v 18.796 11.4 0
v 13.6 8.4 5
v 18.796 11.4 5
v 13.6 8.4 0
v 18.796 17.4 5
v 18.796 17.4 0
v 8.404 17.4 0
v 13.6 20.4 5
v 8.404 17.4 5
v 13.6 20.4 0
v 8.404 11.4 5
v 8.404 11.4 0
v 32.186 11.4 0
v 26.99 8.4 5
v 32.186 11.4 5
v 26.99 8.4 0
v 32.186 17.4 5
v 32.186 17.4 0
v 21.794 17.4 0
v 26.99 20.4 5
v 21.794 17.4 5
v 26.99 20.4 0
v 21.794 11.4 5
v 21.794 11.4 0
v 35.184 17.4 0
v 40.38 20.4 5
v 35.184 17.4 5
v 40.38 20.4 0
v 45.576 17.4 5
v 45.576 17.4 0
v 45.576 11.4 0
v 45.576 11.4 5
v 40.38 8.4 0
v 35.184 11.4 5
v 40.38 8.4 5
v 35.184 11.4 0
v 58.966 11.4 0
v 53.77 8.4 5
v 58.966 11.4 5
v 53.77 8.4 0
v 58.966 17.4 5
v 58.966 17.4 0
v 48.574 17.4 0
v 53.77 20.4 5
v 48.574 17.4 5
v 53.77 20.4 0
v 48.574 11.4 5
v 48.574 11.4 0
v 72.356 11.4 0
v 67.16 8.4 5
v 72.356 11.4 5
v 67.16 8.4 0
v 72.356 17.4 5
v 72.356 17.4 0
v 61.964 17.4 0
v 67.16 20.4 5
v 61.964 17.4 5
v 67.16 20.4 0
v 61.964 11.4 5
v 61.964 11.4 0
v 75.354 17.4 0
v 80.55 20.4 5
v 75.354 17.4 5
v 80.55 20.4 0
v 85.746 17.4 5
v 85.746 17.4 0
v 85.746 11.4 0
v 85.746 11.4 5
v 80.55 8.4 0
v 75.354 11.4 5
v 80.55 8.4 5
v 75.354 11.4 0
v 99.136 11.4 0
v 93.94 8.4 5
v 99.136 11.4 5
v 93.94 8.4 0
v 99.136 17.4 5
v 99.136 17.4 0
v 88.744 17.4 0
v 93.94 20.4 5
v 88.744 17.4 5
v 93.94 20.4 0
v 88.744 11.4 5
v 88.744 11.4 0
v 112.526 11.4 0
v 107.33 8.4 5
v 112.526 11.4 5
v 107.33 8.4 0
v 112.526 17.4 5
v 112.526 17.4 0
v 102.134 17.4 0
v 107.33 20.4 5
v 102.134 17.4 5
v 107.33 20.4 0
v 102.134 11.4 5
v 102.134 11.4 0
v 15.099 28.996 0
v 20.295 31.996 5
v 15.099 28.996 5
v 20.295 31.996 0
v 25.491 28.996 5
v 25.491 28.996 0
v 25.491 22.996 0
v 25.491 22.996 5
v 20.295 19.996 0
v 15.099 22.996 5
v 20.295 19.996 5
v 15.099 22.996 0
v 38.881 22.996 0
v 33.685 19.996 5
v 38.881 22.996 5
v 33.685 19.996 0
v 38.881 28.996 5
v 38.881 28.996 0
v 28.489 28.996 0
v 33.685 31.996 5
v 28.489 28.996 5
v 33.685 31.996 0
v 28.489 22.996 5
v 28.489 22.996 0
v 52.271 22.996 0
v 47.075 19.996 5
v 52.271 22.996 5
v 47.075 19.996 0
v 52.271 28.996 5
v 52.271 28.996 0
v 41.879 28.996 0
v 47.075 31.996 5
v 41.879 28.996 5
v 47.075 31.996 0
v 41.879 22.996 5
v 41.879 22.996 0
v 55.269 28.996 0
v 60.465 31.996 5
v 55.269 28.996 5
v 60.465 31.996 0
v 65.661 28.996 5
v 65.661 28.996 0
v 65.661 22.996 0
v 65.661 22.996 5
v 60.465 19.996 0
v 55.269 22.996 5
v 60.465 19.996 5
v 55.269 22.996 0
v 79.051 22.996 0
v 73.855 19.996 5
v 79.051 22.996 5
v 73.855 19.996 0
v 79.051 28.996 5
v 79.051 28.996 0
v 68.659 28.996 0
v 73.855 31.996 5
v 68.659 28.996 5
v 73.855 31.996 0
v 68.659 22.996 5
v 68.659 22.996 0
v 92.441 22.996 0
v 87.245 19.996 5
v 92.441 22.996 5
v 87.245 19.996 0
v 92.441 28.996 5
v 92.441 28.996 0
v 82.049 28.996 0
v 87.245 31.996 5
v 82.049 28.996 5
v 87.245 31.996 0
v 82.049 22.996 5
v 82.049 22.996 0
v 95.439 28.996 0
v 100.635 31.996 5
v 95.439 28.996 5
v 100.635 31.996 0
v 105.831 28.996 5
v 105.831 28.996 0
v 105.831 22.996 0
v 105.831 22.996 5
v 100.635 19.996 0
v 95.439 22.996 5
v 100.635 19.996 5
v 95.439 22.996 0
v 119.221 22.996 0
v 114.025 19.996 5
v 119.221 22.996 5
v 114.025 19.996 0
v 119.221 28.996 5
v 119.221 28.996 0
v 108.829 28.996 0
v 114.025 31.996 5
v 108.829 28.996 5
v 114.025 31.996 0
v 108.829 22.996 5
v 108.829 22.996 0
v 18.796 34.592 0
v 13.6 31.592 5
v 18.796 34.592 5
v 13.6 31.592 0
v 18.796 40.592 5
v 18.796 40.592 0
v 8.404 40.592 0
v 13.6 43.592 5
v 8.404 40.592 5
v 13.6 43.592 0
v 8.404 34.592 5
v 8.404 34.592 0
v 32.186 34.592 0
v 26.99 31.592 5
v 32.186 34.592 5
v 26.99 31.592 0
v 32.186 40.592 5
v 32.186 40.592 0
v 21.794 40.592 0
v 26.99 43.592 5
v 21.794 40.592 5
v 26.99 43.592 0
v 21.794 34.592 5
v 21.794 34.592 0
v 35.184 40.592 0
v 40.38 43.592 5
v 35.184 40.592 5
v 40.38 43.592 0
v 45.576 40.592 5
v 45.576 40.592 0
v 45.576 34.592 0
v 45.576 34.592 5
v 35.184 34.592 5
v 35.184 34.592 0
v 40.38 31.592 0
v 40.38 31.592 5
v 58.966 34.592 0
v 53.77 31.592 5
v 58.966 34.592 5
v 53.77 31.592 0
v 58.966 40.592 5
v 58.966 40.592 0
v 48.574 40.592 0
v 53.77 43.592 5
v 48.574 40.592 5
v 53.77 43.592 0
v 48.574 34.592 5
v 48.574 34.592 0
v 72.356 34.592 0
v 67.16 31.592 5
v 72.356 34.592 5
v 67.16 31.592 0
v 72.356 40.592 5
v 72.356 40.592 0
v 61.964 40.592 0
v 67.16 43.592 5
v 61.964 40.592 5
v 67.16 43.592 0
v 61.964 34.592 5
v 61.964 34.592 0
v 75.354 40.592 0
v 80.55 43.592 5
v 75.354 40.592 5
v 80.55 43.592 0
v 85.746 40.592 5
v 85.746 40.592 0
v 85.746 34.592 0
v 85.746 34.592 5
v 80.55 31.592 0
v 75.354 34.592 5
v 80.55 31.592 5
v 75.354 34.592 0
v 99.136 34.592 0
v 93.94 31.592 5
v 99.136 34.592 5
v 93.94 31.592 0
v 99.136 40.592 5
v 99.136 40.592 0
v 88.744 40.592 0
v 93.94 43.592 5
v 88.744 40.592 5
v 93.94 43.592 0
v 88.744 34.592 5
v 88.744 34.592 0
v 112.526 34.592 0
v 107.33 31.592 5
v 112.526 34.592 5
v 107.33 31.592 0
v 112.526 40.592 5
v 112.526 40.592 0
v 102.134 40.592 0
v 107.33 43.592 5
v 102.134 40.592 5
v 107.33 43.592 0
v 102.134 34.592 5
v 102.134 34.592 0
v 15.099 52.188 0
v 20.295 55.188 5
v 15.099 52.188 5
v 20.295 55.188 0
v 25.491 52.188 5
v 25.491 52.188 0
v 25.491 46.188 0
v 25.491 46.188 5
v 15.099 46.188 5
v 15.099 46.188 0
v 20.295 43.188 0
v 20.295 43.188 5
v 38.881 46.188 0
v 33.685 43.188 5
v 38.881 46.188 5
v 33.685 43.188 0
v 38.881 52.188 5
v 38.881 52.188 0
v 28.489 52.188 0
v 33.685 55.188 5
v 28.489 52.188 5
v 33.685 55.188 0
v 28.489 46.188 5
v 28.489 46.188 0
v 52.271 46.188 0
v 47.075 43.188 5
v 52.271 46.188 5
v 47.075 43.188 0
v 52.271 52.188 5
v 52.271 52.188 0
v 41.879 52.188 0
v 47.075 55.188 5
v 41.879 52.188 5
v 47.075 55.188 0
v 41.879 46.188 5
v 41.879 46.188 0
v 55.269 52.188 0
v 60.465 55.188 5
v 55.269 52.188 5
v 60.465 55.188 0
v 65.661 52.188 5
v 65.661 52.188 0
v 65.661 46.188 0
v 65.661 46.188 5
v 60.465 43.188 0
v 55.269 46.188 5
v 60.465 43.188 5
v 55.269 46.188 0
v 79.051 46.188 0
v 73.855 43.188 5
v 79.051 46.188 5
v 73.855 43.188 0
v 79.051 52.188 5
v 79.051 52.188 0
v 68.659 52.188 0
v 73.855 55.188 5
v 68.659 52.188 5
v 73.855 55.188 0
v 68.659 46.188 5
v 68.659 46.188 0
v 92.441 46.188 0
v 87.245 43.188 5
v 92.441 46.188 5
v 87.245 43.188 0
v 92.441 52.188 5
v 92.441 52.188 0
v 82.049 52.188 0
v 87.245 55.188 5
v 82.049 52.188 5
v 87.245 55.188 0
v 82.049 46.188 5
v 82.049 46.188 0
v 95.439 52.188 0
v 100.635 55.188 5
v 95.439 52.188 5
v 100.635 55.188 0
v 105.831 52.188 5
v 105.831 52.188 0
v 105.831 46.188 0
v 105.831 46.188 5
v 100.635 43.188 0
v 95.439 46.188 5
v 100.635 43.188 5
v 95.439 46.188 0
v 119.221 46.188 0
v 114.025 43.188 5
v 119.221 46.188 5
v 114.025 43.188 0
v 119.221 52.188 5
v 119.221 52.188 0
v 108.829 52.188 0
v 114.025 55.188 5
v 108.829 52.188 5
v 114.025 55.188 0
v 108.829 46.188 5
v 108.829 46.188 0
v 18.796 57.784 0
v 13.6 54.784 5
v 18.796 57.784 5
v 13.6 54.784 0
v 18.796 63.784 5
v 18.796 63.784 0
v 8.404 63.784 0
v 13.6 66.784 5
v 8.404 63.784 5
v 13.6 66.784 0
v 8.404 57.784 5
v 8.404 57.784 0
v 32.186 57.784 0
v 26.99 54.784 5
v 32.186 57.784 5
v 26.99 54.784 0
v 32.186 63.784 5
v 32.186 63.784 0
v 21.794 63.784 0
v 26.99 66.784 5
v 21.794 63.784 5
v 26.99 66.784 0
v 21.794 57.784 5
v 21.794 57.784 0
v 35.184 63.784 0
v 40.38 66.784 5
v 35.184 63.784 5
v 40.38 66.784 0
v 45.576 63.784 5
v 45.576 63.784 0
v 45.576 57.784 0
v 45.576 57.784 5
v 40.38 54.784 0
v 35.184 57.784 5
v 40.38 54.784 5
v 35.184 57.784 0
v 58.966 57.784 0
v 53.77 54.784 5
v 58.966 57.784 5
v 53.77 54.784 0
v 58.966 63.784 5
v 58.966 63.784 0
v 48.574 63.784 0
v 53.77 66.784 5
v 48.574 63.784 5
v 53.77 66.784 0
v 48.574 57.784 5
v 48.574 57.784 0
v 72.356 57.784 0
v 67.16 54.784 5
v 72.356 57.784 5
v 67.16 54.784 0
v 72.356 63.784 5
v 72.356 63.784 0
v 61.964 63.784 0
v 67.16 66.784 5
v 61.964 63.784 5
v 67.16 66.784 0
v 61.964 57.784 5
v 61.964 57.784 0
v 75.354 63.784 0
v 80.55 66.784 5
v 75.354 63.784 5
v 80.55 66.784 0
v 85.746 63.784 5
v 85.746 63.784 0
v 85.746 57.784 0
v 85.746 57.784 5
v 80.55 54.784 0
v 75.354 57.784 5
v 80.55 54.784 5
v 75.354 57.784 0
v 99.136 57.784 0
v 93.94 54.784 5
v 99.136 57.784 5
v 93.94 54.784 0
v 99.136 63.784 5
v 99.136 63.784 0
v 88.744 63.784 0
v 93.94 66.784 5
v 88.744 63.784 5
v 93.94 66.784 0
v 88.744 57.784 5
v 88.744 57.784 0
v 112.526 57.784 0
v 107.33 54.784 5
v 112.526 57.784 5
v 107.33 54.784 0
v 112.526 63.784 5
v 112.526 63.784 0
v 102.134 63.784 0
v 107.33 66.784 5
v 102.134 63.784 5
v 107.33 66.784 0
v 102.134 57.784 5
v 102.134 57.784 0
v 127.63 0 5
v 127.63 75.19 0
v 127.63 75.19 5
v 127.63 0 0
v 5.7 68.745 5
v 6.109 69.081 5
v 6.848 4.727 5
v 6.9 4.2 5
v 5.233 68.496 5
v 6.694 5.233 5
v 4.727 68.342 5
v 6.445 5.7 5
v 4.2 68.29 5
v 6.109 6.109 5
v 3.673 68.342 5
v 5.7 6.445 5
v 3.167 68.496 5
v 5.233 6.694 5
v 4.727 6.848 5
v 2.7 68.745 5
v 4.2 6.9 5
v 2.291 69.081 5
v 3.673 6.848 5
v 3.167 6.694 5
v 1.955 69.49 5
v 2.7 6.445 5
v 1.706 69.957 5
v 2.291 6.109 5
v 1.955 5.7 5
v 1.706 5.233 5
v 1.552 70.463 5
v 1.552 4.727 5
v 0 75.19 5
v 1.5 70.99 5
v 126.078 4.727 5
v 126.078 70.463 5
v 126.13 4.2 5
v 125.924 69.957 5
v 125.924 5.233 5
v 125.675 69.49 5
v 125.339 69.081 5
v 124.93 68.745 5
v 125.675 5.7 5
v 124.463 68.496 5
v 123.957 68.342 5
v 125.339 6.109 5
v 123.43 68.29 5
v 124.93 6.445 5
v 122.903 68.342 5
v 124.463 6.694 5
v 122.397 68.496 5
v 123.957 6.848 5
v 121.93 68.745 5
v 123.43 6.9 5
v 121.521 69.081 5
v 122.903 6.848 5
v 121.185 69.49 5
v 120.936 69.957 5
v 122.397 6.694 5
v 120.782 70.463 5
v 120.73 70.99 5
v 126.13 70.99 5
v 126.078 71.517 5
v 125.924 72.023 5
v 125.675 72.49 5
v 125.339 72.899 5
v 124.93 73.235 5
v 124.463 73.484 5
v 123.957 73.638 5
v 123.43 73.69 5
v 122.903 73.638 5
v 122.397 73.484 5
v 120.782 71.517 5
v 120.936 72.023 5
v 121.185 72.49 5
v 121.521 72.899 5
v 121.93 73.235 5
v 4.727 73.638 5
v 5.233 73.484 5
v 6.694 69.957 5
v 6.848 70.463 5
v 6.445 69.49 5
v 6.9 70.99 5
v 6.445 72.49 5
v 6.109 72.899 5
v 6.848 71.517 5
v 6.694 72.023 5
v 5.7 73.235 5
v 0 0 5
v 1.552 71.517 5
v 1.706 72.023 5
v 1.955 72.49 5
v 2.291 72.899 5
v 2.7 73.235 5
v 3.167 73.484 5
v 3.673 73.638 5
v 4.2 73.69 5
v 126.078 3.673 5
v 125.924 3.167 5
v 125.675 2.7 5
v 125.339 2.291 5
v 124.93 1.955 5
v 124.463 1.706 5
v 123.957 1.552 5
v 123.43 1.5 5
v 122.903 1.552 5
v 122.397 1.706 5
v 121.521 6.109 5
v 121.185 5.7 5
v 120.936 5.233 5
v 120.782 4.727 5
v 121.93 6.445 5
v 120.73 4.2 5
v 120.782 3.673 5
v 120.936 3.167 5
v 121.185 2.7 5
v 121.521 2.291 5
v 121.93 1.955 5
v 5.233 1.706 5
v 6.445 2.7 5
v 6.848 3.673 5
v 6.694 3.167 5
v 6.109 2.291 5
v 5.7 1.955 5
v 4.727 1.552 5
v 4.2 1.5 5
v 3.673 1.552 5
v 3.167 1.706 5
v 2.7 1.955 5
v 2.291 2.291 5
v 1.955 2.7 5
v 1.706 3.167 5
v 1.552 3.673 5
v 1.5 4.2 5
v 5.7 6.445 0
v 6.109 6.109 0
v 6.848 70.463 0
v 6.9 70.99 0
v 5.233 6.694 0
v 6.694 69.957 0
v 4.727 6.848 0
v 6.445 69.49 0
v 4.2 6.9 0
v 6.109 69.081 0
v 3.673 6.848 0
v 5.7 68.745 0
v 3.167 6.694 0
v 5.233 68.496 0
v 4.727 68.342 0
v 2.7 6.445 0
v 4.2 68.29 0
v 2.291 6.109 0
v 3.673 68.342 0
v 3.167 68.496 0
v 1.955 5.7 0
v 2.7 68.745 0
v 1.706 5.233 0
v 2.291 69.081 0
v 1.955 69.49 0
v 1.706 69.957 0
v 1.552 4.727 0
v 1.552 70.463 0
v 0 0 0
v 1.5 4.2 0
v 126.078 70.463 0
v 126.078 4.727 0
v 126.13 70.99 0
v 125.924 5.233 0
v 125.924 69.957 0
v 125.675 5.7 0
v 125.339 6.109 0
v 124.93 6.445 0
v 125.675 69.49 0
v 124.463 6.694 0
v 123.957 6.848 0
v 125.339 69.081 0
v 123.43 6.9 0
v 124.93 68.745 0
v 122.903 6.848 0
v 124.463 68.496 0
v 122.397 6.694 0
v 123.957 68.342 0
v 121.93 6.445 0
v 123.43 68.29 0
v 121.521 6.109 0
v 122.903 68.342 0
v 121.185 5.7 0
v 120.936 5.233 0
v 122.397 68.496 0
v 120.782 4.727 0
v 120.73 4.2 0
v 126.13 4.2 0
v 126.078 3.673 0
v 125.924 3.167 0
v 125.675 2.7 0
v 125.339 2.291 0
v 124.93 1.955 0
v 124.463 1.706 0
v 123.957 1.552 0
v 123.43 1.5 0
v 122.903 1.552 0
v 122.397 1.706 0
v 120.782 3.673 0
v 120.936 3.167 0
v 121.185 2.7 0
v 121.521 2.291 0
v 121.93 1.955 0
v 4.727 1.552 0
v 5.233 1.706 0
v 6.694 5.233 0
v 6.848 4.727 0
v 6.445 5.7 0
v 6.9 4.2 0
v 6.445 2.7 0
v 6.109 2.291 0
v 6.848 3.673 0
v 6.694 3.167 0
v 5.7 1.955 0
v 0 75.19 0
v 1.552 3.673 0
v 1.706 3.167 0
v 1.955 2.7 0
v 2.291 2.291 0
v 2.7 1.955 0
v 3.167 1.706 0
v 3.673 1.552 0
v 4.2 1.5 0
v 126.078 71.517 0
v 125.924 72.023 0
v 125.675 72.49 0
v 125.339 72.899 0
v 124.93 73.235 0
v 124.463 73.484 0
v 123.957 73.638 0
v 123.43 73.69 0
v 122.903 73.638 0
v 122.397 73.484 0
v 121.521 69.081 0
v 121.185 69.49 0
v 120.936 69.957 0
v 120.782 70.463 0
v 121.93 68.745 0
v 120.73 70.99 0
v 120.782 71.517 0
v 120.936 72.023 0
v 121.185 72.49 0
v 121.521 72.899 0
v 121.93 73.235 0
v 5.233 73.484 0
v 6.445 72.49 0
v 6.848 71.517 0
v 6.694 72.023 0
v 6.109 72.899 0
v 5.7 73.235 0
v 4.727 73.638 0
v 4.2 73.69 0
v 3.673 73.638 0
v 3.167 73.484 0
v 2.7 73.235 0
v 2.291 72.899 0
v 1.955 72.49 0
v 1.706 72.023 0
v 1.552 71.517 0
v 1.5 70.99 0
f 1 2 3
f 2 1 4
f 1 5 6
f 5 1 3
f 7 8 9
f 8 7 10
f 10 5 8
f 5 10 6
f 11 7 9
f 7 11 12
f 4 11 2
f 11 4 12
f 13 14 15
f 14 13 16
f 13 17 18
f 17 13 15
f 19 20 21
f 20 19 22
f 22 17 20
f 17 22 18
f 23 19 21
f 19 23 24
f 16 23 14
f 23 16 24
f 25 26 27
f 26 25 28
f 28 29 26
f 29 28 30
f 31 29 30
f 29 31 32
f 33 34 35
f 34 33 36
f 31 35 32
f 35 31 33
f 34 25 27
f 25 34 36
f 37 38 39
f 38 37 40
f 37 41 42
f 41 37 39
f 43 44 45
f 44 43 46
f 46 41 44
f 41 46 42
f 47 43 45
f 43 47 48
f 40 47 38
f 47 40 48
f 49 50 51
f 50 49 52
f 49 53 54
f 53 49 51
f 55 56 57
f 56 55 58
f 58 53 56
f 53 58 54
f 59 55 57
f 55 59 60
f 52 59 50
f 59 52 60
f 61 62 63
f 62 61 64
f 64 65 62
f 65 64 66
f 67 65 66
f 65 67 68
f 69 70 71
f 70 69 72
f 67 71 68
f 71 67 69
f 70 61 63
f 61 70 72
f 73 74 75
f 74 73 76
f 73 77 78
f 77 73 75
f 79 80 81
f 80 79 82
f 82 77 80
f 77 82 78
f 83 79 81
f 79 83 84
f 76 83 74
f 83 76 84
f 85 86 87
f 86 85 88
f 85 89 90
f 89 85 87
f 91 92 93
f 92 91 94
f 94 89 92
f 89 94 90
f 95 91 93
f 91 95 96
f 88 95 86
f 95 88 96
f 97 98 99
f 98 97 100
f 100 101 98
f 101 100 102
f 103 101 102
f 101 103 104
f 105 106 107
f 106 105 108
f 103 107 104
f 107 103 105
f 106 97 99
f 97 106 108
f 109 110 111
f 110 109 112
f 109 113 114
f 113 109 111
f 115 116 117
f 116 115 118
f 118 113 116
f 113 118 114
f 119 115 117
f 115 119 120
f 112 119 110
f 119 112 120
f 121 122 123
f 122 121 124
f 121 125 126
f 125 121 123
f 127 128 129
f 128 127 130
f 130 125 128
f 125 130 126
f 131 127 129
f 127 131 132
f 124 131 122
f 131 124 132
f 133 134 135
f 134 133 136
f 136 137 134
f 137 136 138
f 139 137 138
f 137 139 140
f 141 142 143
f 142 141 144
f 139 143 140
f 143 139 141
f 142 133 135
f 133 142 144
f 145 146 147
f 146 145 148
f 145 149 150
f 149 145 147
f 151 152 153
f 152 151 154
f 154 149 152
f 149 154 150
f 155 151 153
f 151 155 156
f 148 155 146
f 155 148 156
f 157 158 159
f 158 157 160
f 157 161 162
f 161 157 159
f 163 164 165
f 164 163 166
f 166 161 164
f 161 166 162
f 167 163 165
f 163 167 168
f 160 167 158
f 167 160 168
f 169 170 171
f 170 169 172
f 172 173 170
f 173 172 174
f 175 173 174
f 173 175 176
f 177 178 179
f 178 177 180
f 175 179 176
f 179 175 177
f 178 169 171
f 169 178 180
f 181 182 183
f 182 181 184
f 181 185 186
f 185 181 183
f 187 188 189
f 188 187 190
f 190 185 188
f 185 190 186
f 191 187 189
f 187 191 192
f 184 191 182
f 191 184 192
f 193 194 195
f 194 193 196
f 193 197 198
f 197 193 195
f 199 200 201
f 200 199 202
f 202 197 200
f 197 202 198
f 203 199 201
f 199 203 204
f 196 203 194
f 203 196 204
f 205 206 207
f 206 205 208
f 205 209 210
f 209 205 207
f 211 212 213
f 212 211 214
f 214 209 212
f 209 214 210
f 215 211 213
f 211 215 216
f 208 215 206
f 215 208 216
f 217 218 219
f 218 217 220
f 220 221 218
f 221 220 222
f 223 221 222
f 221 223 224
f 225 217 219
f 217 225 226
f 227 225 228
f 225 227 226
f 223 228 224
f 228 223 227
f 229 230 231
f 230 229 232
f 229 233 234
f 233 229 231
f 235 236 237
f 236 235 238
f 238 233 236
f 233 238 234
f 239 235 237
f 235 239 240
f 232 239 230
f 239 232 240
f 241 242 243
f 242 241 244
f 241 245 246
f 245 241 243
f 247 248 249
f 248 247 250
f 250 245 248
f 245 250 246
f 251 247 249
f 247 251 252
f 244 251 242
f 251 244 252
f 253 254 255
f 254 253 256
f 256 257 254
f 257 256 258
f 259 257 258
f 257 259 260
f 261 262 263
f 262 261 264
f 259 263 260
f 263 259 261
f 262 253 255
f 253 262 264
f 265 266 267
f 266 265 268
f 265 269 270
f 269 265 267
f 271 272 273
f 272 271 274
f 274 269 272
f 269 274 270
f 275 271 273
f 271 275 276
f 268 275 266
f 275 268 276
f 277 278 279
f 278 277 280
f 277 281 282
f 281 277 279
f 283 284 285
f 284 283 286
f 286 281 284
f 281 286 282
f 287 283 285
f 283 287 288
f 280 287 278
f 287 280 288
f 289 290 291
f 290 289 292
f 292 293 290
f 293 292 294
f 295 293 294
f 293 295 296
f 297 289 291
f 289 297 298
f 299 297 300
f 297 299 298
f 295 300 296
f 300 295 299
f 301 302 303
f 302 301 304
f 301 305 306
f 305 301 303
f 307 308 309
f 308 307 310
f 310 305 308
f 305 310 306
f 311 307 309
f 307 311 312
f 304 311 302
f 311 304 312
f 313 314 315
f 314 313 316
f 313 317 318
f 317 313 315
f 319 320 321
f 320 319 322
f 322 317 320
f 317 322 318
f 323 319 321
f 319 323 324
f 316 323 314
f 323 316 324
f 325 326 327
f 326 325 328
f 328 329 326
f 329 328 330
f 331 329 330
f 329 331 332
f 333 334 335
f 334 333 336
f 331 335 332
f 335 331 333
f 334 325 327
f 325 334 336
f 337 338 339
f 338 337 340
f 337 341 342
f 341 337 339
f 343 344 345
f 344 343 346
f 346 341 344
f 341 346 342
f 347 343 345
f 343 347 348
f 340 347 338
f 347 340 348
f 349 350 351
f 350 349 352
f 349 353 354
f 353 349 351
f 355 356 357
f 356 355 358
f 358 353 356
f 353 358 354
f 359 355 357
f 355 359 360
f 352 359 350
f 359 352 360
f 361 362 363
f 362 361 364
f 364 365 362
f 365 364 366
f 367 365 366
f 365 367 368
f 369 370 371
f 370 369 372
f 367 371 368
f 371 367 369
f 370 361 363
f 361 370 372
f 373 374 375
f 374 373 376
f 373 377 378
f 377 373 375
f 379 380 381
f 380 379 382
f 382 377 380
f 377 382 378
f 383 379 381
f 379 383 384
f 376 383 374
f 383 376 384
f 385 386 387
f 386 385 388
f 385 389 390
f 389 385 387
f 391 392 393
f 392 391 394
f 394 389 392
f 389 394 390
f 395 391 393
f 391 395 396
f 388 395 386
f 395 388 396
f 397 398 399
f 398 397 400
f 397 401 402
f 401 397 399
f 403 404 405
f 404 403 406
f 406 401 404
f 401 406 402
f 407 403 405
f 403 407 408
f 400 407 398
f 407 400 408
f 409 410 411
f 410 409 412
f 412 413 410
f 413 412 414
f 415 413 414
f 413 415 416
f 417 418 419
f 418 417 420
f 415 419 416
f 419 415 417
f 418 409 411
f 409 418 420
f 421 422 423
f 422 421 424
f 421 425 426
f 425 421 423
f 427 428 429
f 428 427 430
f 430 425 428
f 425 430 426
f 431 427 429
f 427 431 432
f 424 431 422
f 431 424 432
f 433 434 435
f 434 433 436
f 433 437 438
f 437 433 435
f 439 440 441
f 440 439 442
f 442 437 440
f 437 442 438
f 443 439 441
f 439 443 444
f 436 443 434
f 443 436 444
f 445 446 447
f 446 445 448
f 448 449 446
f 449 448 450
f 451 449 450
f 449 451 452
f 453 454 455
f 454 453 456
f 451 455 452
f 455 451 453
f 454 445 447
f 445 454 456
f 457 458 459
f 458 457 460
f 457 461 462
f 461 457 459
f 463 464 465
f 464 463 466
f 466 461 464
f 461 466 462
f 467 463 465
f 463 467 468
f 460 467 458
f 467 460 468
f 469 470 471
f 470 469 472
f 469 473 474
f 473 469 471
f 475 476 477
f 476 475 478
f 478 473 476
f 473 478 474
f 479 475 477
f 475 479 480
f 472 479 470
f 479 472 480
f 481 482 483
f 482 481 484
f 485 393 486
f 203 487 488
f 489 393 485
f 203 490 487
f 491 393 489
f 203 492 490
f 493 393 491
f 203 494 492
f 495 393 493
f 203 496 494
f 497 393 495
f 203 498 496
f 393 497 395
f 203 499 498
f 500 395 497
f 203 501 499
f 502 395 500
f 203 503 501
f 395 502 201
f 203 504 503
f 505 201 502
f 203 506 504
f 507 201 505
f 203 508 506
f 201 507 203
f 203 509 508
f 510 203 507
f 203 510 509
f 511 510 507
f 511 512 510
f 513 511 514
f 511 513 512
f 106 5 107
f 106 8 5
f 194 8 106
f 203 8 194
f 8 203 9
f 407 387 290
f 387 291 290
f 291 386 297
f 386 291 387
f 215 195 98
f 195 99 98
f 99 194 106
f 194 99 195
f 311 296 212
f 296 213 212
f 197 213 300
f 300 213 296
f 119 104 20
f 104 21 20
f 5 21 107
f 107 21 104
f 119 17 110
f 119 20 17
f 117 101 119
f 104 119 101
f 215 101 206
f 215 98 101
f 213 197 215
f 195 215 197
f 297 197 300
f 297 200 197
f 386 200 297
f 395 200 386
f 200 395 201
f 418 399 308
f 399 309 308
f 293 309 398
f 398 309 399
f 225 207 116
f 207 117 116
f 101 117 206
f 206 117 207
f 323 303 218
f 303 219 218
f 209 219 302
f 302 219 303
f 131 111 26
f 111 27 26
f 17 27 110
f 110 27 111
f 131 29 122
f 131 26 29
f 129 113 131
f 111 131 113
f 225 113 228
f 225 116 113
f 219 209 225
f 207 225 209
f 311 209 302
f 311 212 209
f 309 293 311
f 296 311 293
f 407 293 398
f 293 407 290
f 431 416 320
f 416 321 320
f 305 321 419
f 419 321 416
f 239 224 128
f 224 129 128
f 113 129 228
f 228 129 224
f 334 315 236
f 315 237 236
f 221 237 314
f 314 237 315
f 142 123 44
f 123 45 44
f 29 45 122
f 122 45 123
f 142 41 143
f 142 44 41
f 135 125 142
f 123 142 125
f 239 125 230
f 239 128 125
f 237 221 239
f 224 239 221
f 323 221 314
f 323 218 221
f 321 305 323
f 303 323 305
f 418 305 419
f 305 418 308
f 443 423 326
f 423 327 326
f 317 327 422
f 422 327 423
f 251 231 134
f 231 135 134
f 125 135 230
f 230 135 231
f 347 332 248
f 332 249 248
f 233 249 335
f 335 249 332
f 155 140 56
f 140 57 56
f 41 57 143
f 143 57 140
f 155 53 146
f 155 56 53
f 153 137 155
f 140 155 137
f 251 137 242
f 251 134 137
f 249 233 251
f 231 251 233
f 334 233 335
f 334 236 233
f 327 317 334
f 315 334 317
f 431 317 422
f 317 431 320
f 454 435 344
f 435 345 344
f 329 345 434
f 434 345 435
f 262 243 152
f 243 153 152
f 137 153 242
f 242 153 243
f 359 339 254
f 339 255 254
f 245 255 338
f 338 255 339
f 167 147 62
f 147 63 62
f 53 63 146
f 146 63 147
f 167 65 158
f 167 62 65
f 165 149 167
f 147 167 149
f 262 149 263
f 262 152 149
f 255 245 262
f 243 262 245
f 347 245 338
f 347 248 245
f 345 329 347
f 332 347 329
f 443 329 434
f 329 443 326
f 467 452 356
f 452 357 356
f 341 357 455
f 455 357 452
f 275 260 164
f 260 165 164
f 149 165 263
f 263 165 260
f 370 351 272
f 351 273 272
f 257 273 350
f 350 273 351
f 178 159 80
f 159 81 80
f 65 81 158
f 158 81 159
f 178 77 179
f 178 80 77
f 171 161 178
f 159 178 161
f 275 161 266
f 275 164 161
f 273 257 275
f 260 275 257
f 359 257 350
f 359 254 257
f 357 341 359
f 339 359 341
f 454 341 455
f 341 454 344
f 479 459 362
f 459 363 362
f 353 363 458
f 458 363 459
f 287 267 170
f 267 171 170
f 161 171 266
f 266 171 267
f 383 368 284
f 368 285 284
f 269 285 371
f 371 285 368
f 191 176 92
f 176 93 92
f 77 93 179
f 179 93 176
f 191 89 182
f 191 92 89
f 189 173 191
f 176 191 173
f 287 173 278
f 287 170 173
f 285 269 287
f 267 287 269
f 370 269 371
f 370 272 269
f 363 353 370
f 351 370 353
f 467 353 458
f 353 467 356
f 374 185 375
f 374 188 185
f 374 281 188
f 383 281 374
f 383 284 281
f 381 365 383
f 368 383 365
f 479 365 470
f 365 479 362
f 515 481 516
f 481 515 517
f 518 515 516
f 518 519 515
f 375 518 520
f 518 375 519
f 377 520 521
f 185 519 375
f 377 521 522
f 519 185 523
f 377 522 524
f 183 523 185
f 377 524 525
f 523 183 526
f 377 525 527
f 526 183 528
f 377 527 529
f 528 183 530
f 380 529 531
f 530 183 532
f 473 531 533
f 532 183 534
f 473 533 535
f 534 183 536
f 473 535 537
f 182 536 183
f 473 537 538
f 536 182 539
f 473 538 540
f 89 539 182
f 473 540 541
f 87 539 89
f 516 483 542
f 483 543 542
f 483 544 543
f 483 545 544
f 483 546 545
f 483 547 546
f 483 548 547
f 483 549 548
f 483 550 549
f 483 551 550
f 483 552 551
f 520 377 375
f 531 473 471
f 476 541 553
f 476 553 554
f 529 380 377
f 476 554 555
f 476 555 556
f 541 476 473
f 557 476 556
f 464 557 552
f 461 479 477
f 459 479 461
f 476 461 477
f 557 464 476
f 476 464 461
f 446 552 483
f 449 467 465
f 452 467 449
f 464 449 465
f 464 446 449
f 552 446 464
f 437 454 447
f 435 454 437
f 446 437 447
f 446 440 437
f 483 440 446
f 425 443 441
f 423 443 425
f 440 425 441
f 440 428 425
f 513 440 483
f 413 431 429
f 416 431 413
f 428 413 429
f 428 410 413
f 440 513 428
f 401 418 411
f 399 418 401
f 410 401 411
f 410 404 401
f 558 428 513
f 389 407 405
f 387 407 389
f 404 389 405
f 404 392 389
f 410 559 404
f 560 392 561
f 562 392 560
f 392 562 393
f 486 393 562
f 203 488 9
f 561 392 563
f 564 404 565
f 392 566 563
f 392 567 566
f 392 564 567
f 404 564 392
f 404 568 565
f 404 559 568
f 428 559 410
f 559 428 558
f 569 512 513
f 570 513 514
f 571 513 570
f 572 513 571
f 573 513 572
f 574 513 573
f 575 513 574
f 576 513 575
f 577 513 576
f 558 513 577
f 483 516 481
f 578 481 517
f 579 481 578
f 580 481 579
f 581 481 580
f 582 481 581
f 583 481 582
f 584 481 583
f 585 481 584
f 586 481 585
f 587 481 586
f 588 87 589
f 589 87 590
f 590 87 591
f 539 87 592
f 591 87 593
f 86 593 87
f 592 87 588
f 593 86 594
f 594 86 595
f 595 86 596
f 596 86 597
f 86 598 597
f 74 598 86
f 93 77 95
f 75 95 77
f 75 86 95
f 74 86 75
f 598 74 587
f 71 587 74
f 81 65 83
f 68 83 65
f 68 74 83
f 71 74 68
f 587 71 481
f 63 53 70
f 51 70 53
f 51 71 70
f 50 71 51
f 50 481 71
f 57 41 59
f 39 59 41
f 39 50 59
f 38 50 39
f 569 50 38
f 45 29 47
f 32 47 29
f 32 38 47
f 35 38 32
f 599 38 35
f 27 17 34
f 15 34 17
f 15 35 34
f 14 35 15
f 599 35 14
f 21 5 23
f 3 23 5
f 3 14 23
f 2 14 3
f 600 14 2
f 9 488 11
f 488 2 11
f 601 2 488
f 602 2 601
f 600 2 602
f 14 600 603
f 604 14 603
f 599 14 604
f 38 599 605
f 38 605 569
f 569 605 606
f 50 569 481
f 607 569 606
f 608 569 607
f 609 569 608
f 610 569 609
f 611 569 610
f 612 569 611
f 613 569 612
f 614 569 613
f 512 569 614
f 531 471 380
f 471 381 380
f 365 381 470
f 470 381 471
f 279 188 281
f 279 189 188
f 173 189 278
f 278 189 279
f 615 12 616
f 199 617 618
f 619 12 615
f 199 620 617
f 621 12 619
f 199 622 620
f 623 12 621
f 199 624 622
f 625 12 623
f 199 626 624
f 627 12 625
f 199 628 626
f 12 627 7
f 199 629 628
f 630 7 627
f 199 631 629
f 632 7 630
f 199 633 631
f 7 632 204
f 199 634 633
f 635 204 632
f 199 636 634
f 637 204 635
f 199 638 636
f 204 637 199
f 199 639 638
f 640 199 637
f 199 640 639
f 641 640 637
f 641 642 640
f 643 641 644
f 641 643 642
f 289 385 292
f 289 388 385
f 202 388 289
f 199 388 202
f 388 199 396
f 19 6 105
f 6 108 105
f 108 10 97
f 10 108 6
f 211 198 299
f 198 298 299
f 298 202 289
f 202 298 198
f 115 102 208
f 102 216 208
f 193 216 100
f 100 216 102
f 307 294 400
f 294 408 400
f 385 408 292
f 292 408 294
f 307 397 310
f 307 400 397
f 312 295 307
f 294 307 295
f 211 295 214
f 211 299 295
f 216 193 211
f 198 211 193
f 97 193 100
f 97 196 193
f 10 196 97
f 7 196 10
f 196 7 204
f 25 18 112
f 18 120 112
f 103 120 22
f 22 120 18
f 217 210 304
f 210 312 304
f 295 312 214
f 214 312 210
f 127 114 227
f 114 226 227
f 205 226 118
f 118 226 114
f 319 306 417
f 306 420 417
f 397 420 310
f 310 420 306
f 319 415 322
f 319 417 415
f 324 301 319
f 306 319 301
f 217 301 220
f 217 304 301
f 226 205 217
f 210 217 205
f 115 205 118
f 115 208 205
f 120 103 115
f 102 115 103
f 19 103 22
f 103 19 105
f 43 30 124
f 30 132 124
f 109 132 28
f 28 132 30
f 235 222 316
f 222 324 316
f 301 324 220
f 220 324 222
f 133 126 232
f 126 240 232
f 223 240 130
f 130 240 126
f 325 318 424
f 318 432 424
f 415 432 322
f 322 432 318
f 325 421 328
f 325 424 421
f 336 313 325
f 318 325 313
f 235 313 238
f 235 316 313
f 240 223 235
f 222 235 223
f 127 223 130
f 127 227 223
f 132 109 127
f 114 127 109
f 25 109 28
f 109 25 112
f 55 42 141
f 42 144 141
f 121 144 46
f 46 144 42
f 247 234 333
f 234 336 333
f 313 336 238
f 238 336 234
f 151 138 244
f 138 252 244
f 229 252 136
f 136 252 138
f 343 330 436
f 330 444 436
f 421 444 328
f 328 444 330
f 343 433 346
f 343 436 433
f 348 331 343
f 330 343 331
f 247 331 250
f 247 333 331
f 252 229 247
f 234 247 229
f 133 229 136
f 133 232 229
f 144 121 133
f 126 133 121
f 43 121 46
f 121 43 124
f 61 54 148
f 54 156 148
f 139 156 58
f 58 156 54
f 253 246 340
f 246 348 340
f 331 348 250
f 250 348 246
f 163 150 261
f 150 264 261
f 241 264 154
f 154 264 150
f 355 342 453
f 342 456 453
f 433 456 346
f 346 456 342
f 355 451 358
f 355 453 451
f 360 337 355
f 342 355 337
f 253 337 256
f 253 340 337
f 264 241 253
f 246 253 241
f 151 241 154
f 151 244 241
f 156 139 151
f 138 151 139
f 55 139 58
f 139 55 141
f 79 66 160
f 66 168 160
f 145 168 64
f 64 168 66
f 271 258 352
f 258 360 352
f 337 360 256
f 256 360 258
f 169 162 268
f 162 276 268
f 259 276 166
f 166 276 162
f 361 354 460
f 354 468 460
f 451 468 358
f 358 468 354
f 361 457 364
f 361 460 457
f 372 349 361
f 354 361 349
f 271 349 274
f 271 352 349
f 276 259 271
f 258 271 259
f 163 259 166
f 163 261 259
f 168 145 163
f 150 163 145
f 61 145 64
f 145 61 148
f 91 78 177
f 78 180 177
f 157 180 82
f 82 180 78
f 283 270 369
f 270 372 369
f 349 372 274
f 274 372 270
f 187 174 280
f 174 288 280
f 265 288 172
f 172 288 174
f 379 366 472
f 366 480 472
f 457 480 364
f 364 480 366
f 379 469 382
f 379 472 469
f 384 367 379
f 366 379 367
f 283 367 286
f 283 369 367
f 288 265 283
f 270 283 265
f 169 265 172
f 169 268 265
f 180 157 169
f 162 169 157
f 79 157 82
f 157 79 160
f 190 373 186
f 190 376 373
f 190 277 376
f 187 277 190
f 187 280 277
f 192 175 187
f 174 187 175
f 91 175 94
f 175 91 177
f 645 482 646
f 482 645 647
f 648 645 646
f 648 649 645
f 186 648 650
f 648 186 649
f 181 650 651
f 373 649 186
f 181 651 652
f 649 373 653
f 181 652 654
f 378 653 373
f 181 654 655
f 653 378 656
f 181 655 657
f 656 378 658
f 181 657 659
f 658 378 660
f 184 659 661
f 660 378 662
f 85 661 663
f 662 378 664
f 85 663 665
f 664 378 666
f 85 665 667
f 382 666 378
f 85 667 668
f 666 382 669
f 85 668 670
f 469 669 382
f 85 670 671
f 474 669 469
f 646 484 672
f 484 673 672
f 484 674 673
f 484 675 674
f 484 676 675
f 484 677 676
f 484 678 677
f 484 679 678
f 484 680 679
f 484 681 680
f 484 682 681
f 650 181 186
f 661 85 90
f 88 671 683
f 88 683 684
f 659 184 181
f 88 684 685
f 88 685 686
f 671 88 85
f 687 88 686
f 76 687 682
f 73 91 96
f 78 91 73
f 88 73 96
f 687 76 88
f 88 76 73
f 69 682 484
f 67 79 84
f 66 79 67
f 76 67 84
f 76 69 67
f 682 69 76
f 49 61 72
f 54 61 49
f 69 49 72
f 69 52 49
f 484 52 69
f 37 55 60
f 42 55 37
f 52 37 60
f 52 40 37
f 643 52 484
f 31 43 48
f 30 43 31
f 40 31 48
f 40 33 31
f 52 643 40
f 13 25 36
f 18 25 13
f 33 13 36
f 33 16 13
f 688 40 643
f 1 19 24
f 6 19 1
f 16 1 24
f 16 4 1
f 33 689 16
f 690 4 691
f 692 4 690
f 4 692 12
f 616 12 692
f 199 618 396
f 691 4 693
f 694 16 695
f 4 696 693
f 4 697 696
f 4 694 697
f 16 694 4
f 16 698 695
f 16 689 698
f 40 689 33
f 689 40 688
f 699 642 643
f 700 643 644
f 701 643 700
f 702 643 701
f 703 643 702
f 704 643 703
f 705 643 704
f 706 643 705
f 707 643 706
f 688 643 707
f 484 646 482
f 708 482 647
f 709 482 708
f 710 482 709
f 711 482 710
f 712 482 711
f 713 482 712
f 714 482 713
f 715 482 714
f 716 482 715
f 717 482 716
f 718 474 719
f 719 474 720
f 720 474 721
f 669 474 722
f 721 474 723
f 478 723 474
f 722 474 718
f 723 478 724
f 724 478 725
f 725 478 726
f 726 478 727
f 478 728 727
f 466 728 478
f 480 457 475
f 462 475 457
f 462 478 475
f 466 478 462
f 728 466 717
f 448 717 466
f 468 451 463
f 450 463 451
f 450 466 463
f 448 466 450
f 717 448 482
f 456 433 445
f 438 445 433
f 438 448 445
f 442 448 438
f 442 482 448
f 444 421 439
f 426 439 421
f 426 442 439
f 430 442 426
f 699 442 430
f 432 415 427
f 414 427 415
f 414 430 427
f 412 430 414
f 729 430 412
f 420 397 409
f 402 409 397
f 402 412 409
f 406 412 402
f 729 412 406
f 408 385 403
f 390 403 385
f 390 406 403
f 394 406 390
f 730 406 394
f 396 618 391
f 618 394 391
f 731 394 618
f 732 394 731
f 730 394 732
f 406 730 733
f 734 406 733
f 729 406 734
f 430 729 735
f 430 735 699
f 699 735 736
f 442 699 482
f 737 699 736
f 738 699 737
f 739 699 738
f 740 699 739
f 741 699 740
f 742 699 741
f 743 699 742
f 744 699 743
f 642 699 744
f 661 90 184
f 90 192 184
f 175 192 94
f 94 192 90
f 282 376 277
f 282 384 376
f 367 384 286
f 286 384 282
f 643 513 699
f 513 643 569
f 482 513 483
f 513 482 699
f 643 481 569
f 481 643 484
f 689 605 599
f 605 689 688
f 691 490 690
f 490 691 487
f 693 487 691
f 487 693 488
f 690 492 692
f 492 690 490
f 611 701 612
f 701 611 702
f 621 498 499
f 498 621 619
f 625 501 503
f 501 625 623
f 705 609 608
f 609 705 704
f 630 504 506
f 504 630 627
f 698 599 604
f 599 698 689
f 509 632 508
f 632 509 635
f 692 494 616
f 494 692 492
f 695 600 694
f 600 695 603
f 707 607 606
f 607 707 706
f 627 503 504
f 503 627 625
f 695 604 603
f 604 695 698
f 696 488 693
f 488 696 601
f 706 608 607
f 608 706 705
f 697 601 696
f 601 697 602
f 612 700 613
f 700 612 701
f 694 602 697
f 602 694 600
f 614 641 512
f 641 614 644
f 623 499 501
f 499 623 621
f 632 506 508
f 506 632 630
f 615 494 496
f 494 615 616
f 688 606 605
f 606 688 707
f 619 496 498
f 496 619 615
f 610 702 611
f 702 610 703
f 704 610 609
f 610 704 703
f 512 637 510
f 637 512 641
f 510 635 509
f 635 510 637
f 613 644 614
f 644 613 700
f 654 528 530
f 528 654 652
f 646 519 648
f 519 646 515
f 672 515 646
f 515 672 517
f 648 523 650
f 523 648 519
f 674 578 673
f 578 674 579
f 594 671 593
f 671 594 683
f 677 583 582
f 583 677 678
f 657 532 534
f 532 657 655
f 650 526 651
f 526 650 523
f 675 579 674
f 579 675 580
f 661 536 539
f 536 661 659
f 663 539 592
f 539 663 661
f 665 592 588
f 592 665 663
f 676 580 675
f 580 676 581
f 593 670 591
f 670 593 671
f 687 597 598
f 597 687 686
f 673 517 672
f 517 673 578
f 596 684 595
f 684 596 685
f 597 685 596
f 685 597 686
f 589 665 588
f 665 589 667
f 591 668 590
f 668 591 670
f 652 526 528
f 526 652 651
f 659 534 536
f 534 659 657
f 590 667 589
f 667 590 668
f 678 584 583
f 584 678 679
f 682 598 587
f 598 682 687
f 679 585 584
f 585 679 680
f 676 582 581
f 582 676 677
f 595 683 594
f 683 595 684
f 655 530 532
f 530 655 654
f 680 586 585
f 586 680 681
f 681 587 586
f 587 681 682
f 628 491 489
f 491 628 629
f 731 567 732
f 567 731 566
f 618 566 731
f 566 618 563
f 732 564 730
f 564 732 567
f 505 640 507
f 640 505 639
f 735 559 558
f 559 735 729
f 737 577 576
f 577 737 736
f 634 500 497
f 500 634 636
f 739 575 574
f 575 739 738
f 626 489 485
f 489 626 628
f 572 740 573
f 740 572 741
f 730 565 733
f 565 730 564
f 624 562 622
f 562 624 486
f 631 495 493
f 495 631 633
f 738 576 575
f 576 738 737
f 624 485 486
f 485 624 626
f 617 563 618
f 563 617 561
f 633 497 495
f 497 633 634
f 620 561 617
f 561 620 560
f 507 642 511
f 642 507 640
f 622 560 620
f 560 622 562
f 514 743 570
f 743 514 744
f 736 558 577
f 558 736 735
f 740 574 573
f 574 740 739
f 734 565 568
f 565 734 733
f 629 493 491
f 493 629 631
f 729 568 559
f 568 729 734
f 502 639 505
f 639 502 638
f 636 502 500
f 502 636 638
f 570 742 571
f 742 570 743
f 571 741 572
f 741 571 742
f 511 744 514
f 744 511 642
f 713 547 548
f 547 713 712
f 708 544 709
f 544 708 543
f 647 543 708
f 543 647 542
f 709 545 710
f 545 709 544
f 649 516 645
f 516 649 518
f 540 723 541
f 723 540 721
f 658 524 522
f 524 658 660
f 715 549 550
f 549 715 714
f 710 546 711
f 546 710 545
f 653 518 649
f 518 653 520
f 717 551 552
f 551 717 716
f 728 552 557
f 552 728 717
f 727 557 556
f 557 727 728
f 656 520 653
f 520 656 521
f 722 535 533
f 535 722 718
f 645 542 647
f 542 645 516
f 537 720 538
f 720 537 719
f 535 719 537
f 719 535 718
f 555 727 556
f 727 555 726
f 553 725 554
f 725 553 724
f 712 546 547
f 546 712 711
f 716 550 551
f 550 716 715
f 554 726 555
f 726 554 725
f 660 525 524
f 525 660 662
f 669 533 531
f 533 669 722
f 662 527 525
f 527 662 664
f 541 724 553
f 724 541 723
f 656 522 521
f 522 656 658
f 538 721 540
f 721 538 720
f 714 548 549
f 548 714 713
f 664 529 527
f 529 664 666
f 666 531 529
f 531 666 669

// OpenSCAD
$fn = 32;

// ----------------------------------------------------------------------
// Honeycomb panel: 127.63 x 75.19 mm, 40 cells of 12 mm
// ----------------------------------------------------------------------

// --- parameters (mm) ---
panel_w = 127.63;         // panel width
panel_d = 75.19;          // panel depth
thick = 5;                // panel thickness
cell_r = 6;               // hex cell circumradius
pitch = 13.39;            // hex cell pitch (centre to centre)
web = 3;                  // web between the cells
columns = 8;              // columns of cells
rows = 5;                 // rows of cells
cell_count = 40;          // total cells
shift_x = 13.6;           // first cell offset in x
shift_y = 14.4;           // first cell offset in y
mount_d = 5.4;            // corner mounting holes
hole_off = 4.2;           // mounting hole offset from the corners

difference() {
  union() {
    cube([panel_w, panel_d, thick]);
  }
  /* hexagonal cells, point-up, cut right through the plate */
  for (row = [0 : rows - 1]) {
    for (col = [0 : columns - 1]) {
      translate([shift_x + col * pitch + (row % 2) * pitch / 2, shift_y + row * pitch * 0.866025, -2.5]) rotate([0, 0, 30]) cylinder(h = thick + 5, d = 2 * cell_r, $fn = 6);
    }
  }
  /* corner mounting holes, clear of the outer cell web */
  translate([4.2, 4.2, -2.5]) cylinder(h = thick + 5, d = mount_d);
  translate([123.43, 4.2, -2.5]) cylinder(h = thick + 5, d = mount_d);
  translate([4.2, 70.99, -2.5]) cylinder(h = thick + 5, d = mount_d);
  translate([123.43, 70.99, -2.5]) cylinder(h = thick + 5, d = mount_d);
}
